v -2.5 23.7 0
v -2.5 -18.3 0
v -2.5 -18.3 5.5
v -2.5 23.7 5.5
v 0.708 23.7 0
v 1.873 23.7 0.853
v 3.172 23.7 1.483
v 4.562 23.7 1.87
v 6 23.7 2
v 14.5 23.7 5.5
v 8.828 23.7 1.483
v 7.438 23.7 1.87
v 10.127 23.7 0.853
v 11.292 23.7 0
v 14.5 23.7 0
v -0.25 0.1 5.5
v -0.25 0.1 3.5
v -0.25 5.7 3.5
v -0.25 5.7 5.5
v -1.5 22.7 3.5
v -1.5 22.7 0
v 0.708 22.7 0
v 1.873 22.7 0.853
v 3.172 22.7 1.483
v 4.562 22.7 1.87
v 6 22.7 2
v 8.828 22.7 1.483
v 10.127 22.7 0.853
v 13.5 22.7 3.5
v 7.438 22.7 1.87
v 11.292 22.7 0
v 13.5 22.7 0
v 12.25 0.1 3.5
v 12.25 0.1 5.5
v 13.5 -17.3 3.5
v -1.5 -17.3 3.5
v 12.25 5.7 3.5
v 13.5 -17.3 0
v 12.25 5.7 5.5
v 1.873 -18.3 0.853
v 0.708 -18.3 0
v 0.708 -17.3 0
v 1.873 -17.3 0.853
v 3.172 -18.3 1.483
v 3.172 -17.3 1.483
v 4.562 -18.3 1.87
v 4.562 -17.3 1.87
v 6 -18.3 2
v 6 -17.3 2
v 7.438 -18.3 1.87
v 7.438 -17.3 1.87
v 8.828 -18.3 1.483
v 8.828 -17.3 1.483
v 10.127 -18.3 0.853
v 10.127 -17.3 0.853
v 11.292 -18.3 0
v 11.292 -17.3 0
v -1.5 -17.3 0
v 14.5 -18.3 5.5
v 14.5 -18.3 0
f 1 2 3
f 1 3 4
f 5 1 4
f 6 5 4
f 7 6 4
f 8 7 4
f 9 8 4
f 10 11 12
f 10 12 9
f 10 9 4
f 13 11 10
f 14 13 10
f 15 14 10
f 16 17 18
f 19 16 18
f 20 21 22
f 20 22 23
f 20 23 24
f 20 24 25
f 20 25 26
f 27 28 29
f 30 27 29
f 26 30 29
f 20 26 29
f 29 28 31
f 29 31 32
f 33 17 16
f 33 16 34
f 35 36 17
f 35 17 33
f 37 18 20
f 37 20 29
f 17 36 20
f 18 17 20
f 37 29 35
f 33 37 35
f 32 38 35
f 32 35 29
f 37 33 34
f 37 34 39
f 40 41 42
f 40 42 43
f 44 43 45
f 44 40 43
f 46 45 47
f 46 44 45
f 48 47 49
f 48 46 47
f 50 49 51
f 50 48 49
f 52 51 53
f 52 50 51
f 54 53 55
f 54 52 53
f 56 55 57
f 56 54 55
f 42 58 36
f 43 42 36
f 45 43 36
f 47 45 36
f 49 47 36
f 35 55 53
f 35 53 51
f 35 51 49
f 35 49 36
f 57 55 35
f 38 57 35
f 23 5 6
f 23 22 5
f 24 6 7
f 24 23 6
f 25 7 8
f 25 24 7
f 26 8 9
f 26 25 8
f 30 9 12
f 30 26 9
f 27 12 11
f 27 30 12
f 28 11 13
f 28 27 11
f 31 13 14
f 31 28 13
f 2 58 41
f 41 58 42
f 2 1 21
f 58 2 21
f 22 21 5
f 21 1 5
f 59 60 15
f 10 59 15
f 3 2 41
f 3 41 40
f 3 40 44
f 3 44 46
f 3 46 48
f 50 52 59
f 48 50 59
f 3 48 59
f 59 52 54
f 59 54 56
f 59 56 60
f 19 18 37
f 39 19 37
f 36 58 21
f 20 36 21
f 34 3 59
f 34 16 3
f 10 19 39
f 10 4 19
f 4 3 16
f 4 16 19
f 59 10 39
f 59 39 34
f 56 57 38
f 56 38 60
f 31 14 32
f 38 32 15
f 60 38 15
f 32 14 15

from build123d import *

# Parameters (mm, degrees)
CYLINDER004_R     = 8
CYLINDER004_DEPTH = 45
BOX007_W          = 15
BOX007_H          = 40
BOX007_DEPTH      = 5.5
BOX006_W          = 17
BOX006_H          = 42
BOX006_DEPTH      = 5.5
BOX002_W          = 12.5
BOX002_H          = 5.6
BOX002_DEPTH      = 10
BOX005_W          = 15
BOX005_H          = 40
BOX005_DEPTH      = 2


with BuildPart() as cylinder004:
    # Cylinder004 → Cylinder004 (new body)
    with BuildSketch(Plane(origin=(6, -19.5, -6), x_dir=(1, 0, 0), z_dir=(0, 1, 0))):
        Circle(CYLINDER004_R)
    extrude(amount=CYLINDER004_DEPTH)


with BuildPart() as cube007:
    # Box007 → Box007 (new body)
    with BuildSketch(Plane(origin=(-1.5, -17.3, 0), x_dir=(1, 0, 0), z_dir=(0, 0, 1))):
        with Locations((7.5, 20)):
            Rectangle(BOX007_W, BOX007_H)
    extrude(amount=BOX007_DEPTH)


with BuildPart() as cut008:
    # Box006 → Box006 (new body)
    with BuildSketch(Plane(origin=(-2.5, -18.3, 0), x_dir=(1, 0, 0), z_dir=(0, 0, 1))):
        with Locations((8.5, 21)):
            Rectangle(BOX006_W, BOX006_H)
    extrude(amount=BOX006_DEPTH)

    # Cut008: cut Cube007
    add(cube007.part, mode=Mode.SUBTRACT)


with BuildPart() as cube002:
    # Box002 → Box002 (new body)
    with BuildSketch(Plane(origin=(-0.25, 0.1, 0), x_dir=(1, 0, 0), z_dir=(0, 0, 1))):
        with Locations((6.25, 2.8)):
            Rectangle(BOX002_W, BOX002_H)
    extrude(amount=BOX002_DEPTH)


with BuildPart() as trafficlightconntopcover:
    # Box005 → Box005 (new body)
    with BuildSketch(Plane(origin=(-1.5, -17.3, 0), x_dir=(1, 0, 0), z_dir=(0, 0, 1))):
        with Locations((7.5, 20)):
            Rectangle(BOX005_W, BOX005_H)
    extrude(amount=BOX005_DEPTH)

    # Cut007: cut Cube002
    add(cube002.part, mode=Mode.SUBTRACT)


with BuildPart() as trafficlightconntopcover_1:
    # Cut007 placement: moved
    add(trafficlightconntopcover.part.moved(Location((0, 0, 3.5))))

    # Fusion003: union Cut008
    add(cut008.part)

    # Cut015: cut Cylinder004
    add(cylinder004.part, mode=Mode.SUBTRACT)


solid = trafficlightconntopcover_1.part
